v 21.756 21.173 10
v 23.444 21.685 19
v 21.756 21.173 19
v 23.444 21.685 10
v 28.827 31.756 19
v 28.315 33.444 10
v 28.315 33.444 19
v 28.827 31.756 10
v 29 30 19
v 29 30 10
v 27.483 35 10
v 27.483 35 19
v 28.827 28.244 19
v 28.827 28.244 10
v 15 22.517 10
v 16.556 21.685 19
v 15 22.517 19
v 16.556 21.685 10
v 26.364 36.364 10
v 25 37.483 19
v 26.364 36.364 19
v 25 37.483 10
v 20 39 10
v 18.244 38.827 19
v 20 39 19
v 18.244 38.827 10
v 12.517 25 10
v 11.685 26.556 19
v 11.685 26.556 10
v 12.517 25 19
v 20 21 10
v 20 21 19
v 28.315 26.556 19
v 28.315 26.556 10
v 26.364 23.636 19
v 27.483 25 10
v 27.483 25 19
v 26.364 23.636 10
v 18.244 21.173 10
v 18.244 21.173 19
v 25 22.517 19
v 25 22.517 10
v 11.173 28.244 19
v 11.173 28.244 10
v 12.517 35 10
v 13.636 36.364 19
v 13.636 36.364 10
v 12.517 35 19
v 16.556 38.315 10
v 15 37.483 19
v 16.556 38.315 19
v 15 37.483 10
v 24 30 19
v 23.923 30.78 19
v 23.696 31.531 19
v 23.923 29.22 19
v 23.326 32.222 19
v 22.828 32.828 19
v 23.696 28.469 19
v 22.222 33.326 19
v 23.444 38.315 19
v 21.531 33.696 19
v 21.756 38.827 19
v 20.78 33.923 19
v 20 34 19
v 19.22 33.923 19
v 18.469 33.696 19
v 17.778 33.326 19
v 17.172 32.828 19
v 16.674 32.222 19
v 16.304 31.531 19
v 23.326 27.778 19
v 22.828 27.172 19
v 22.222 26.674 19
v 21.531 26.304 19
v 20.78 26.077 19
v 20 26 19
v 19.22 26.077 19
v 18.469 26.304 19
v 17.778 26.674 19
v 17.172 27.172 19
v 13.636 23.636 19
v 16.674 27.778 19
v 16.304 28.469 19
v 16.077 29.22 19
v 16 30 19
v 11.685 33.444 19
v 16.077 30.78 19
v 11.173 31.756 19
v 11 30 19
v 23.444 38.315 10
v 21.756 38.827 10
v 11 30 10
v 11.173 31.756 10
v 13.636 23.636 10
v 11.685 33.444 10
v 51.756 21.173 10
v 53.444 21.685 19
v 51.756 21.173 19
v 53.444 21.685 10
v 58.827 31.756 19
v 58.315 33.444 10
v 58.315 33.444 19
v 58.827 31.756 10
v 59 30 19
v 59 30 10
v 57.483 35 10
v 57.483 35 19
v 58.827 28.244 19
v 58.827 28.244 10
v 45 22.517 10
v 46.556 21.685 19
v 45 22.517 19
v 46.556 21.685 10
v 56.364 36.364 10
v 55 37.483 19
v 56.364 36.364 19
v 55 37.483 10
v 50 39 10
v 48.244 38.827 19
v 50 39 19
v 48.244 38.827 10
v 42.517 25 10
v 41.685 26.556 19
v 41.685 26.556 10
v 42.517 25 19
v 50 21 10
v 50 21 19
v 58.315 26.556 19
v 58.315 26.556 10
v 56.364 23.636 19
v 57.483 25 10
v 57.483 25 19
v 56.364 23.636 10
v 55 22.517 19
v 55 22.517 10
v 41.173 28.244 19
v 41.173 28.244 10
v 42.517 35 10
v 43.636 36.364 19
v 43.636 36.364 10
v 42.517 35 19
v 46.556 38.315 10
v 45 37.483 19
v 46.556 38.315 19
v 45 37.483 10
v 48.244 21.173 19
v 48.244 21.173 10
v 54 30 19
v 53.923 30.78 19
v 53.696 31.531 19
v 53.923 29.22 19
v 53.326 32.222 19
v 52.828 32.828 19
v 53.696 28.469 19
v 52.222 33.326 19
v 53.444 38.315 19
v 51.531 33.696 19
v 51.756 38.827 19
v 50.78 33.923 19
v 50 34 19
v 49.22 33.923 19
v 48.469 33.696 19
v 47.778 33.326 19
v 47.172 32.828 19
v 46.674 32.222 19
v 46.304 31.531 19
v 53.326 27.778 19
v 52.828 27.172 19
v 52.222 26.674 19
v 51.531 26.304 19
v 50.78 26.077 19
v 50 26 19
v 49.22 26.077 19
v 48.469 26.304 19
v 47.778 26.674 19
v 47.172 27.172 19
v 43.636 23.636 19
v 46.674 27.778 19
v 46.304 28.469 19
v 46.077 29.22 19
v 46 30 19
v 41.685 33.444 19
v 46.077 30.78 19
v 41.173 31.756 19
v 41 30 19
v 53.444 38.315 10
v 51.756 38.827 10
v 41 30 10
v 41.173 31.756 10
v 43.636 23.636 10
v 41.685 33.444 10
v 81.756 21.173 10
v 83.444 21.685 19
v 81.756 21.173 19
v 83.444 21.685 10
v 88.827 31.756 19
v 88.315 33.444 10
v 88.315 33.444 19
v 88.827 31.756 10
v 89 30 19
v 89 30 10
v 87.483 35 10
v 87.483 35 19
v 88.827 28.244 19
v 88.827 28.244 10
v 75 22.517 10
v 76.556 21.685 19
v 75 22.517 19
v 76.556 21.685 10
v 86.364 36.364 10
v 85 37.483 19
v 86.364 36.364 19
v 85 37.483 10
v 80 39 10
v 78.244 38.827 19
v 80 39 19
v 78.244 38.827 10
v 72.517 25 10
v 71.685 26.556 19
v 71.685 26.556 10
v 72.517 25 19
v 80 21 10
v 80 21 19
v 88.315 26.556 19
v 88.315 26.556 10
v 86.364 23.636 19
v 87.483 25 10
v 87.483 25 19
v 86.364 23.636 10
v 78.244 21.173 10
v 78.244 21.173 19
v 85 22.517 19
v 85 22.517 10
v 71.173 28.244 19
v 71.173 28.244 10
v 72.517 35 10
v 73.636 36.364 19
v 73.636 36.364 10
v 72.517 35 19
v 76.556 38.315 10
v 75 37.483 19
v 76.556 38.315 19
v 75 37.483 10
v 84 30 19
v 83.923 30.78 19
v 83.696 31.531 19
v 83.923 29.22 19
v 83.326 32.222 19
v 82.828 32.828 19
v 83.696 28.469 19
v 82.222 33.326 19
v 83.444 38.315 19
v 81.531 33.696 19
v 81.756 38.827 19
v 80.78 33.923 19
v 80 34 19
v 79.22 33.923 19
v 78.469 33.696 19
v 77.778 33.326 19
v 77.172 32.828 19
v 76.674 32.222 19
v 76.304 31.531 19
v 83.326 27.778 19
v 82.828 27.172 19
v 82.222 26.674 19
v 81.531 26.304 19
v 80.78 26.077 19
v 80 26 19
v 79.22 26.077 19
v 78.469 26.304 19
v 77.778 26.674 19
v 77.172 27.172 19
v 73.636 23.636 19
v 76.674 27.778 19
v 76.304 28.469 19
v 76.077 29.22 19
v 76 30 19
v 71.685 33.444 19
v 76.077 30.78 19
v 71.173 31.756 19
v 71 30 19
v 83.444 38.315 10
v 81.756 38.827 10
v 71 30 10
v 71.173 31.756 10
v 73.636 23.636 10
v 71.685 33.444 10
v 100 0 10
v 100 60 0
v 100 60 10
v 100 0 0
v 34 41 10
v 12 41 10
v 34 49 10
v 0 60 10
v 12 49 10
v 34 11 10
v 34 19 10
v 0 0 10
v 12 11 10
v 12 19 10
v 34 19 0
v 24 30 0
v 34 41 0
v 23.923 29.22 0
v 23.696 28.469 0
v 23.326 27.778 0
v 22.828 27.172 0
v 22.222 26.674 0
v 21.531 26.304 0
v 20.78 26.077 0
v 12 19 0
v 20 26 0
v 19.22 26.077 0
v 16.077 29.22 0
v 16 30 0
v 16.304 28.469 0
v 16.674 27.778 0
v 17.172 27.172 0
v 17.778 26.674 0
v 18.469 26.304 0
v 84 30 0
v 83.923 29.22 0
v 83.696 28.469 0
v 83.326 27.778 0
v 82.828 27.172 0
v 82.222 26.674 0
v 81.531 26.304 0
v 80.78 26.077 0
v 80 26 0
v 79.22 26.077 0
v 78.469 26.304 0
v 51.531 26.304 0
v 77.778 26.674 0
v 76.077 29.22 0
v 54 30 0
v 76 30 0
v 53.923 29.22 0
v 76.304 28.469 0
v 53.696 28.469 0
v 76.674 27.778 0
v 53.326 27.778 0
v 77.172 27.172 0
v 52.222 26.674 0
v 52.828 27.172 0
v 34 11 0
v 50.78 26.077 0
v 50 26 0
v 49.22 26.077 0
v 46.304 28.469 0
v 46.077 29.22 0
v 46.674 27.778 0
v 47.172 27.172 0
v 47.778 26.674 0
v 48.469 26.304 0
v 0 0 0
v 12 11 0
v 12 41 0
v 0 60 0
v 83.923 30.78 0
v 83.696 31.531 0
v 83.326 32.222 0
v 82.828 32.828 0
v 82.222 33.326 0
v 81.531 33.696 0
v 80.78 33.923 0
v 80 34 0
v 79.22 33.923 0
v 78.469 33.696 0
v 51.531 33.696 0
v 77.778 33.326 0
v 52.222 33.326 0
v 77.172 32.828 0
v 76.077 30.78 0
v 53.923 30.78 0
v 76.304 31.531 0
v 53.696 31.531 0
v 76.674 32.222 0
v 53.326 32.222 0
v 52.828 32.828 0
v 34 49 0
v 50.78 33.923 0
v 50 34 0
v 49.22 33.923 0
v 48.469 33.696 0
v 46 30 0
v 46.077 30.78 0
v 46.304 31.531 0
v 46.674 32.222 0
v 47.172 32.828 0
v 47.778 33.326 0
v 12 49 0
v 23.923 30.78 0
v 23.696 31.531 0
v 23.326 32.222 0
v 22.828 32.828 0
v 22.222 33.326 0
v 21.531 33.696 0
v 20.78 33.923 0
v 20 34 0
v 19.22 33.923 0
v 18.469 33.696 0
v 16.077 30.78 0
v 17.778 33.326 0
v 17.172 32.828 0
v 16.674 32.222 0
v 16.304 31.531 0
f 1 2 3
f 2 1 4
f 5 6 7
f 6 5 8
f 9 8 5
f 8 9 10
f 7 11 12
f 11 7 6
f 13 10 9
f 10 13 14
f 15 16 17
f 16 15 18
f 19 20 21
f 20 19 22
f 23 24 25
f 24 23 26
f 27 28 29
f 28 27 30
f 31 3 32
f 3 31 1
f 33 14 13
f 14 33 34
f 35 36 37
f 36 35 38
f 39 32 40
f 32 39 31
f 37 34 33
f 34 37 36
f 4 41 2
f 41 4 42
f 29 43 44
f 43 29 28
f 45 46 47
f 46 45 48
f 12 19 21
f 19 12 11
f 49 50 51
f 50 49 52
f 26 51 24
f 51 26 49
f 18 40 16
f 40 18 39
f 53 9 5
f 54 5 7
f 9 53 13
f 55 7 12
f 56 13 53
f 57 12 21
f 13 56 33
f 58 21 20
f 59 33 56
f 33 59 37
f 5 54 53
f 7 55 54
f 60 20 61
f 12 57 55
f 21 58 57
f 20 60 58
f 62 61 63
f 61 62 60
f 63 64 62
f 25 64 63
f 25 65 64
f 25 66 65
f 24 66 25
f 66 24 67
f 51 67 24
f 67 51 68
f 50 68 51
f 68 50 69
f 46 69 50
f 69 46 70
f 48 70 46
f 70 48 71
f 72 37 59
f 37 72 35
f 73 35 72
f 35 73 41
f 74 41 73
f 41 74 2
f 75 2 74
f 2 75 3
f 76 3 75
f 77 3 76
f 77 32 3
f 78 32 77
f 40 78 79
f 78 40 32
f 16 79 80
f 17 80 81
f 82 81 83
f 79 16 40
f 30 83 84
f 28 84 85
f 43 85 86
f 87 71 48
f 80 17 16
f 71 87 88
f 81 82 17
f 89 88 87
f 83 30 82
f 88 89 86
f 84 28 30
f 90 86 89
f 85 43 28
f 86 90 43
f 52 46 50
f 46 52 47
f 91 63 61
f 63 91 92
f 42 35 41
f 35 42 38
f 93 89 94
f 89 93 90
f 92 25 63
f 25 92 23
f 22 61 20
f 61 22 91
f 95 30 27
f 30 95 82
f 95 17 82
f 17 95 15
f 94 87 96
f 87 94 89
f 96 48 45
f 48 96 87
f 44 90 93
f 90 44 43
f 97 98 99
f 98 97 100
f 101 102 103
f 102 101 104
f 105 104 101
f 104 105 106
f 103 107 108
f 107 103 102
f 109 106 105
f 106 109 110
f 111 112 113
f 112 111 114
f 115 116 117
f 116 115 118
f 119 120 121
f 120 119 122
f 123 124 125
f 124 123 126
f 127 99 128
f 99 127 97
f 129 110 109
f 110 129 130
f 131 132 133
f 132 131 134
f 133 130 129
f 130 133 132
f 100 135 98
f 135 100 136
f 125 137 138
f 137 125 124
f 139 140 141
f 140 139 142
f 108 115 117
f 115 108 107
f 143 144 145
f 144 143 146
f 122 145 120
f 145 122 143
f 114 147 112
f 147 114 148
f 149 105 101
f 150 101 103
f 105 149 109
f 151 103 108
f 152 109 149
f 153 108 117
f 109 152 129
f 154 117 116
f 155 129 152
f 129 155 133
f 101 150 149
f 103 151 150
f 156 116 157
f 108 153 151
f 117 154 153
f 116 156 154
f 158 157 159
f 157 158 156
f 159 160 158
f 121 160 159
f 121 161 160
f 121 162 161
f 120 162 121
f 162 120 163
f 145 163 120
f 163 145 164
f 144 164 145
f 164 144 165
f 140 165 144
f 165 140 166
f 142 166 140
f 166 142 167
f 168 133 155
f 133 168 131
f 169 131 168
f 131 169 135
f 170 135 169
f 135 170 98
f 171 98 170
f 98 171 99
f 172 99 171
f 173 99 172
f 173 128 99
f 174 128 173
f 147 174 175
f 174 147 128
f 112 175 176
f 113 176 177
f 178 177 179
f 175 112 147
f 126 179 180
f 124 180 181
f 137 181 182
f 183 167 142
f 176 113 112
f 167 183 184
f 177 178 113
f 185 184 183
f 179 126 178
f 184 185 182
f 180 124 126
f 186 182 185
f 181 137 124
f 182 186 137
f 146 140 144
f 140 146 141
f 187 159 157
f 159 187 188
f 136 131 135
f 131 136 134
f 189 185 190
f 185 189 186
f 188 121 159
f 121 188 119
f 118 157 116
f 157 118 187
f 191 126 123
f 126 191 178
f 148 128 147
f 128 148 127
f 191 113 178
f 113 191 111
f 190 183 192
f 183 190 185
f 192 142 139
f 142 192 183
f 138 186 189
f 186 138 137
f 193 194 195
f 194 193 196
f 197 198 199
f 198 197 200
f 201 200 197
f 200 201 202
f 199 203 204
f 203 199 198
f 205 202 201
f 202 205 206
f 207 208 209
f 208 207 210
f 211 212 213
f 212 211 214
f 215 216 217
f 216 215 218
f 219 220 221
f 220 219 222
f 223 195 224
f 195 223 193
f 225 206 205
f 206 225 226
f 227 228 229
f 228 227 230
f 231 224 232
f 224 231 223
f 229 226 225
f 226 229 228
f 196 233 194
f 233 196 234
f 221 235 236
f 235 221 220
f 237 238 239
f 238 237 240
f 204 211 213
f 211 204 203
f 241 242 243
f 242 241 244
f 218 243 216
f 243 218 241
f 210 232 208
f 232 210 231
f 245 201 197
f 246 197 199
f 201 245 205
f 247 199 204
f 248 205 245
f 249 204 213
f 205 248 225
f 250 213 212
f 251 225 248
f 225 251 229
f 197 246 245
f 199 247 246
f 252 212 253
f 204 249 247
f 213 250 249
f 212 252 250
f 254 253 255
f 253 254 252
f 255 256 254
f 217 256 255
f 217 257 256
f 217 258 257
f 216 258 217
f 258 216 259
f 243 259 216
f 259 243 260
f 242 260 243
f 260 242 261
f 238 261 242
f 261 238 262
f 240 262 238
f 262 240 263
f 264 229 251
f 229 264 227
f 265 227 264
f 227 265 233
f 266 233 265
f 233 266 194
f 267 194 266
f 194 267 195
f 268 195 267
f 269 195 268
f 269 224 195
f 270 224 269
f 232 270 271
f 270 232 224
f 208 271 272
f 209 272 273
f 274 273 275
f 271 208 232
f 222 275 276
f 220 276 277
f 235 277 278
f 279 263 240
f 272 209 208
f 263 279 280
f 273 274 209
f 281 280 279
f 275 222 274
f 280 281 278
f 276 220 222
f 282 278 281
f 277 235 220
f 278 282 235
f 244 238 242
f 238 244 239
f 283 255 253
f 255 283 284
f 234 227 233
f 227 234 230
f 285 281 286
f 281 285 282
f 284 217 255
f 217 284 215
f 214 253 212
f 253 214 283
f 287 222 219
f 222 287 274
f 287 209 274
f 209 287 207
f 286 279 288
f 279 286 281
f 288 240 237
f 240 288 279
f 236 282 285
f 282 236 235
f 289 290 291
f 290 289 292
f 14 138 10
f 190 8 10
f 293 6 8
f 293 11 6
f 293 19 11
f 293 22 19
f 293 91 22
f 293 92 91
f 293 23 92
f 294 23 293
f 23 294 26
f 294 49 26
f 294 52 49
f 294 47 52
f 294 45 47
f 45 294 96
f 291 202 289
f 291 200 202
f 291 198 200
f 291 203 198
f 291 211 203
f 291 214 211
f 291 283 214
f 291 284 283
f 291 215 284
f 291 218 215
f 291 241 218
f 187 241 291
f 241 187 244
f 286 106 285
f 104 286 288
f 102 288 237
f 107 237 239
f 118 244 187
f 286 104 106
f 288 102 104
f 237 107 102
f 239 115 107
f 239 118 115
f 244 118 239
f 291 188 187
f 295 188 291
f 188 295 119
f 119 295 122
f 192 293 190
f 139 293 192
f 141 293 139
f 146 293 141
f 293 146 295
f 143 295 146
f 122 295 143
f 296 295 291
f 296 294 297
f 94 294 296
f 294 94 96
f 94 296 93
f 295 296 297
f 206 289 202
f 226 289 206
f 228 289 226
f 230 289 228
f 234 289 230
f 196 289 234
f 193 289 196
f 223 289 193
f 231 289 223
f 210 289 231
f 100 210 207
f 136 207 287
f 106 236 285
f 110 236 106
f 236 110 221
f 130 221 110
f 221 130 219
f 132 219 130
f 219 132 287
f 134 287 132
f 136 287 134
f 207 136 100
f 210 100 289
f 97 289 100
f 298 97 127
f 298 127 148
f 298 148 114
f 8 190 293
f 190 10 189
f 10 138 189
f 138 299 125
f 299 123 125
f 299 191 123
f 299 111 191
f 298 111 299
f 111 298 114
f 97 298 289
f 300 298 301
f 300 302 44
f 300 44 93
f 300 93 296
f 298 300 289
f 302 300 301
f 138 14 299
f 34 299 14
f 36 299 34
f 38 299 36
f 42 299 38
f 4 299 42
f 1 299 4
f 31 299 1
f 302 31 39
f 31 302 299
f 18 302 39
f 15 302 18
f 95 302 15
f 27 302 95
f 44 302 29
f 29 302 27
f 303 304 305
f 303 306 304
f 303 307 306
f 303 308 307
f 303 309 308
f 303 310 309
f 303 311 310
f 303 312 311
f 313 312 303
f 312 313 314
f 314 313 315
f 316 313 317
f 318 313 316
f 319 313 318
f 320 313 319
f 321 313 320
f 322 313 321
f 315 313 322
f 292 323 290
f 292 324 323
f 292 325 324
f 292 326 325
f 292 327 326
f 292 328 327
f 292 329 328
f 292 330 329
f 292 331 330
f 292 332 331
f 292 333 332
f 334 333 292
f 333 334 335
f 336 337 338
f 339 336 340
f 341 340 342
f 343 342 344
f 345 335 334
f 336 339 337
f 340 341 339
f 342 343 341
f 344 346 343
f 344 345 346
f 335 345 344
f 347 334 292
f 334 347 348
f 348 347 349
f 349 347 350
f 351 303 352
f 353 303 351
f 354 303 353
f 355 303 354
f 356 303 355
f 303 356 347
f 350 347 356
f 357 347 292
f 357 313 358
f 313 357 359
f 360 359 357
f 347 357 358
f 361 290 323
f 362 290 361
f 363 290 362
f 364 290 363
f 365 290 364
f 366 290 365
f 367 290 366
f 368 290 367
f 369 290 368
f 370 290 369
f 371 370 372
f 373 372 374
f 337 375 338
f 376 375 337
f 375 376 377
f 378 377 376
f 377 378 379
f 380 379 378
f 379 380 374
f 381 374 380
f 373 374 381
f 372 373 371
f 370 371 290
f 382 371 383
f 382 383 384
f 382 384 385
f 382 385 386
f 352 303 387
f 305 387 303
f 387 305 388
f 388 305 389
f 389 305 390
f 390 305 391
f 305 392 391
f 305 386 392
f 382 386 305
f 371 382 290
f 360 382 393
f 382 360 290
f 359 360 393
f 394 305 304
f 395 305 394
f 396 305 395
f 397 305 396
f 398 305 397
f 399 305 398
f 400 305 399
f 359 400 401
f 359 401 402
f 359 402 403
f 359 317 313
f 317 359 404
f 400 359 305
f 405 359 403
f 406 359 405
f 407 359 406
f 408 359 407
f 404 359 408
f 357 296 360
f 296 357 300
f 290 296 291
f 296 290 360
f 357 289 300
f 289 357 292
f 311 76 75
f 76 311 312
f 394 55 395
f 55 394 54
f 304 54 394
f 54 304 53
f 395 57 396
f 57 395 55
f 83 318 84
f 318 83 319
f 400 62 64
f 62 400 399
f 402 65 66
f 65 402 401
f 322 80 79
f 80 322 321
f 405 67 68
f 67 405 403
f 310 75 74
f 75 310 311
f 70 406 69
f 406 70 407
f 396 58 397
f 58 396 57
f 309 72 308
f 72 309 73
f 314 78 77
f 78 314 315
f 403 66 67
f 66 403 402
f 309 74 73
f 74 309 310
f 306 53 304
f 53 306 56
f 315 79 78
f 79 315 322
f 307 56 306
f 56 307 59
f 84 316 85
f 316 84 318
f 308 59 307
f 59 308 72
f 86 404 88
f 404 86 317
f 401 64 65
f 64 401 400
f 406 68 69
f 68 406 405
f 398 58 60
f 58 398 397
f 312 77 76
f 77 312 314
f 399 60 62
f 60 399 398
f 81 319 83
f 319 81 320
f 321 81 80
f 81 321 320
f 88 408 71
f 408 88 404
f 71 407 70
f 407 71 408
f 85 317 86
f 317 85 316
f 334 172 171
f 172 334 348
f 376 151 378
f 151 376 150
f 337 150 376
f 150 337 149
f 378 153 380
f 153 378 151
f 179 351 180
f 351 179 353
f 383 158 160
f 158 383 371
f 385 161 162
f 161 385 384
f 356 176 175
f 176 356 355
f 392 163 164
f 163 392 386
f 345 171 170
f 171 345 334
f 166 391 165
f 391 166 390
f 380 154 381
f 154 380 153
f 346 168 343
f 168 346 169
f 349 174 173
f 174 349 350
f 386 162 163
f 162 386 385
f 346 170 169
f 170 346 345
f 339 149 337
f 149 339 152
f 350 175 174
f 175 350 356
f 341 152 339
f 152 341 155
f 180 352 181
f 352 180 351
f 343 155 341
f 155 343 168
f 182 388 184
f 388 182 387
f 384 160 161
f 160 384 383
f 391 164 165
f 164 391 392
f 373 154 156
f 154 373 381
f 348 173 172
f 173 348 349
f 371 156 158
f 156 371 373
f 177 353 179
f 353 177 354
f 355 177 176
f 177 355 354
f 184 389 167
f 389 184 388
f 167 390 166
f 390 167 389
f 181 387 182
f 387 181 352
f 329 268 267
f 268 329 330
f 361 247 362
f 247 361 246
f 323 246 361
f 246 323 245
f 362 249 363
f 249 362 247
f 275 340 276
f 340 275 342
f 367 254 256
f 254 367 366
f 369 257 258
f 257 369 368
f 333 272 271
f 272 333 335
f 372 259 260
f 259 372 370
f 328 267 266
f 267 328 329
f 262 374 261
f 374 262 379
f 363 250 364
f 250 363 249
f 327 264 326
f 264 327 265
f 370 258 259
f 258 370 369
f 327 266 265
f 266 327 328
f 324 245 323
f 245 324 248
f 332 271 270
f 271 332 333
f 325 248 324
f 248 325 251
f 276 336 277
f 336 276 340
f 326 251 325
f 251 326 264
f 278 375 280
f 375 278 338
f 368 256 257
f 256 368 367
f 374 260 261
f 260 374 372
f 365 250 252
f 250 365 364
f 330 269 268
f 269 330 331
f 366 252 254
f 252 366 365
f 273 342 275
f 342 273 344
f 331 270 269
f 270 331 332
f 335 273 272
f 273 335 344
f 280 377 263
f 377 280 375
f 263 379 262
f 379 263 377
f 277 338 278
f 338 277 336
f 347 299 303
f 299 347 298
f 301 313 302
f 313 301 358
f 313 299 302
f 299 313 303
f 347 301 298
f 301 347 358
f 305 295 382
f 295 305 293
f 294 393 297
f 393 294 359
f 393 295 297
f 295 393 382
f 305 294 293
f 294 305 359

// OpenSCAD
$fn = 32;

// ----------------------------------------------------------------------
// Drill jig: three_boss_slot jig
// ----------------------------------------------------------------------

// --- parameters (mm) ---
plate_l = 100;            // plate length, X
plate_w = 60;             // plate width, Y
plate_t = 10;             // plate thickness
boss_d = 18;              // guide boss diameter
boss_h = 10;              // boss height above the plate
guide_d = 8;              // guide hole diameter
boss_pitch = 30;          // boss pitch
slot_w = 8;               // clamp slot width
slot_l = 22;              // clamp slot length
slot_x = 12;              // slot start X

n_boss = 3;  // guide bosses
boss_x0 = (plate_l - (n_boss - 1) * boss_pitch) / 2;  // first boss X
boss_top = plate_t - 1 + boss_h;  // boss crown height
total_h = boss_top;  // overall height

difference() {
  union() {
  cube([plate_l, plate_w, plate_t]);
  for (i = [0 : n_boss - 1])
    translate([boss_x0 + i * boss_pitch, plate_w / 2, plate_t - 1])
      cylinder(h = boss_h, d = boss_d);
  }
  for (i = [0 : n_boss - 1])
    translate([boss_x0 + i * boss_pitch, plate_w / 2, -1])
      cylinder(h = plate_t + boss_h, d = guide_d);
  for (cy = [plate_w * 0.25, plate_w * 0.75])
    translate([slot_x, cy - slot_w / 2, -1])
      cube([slot_l, slot_w, plate_t + 2]);
}
